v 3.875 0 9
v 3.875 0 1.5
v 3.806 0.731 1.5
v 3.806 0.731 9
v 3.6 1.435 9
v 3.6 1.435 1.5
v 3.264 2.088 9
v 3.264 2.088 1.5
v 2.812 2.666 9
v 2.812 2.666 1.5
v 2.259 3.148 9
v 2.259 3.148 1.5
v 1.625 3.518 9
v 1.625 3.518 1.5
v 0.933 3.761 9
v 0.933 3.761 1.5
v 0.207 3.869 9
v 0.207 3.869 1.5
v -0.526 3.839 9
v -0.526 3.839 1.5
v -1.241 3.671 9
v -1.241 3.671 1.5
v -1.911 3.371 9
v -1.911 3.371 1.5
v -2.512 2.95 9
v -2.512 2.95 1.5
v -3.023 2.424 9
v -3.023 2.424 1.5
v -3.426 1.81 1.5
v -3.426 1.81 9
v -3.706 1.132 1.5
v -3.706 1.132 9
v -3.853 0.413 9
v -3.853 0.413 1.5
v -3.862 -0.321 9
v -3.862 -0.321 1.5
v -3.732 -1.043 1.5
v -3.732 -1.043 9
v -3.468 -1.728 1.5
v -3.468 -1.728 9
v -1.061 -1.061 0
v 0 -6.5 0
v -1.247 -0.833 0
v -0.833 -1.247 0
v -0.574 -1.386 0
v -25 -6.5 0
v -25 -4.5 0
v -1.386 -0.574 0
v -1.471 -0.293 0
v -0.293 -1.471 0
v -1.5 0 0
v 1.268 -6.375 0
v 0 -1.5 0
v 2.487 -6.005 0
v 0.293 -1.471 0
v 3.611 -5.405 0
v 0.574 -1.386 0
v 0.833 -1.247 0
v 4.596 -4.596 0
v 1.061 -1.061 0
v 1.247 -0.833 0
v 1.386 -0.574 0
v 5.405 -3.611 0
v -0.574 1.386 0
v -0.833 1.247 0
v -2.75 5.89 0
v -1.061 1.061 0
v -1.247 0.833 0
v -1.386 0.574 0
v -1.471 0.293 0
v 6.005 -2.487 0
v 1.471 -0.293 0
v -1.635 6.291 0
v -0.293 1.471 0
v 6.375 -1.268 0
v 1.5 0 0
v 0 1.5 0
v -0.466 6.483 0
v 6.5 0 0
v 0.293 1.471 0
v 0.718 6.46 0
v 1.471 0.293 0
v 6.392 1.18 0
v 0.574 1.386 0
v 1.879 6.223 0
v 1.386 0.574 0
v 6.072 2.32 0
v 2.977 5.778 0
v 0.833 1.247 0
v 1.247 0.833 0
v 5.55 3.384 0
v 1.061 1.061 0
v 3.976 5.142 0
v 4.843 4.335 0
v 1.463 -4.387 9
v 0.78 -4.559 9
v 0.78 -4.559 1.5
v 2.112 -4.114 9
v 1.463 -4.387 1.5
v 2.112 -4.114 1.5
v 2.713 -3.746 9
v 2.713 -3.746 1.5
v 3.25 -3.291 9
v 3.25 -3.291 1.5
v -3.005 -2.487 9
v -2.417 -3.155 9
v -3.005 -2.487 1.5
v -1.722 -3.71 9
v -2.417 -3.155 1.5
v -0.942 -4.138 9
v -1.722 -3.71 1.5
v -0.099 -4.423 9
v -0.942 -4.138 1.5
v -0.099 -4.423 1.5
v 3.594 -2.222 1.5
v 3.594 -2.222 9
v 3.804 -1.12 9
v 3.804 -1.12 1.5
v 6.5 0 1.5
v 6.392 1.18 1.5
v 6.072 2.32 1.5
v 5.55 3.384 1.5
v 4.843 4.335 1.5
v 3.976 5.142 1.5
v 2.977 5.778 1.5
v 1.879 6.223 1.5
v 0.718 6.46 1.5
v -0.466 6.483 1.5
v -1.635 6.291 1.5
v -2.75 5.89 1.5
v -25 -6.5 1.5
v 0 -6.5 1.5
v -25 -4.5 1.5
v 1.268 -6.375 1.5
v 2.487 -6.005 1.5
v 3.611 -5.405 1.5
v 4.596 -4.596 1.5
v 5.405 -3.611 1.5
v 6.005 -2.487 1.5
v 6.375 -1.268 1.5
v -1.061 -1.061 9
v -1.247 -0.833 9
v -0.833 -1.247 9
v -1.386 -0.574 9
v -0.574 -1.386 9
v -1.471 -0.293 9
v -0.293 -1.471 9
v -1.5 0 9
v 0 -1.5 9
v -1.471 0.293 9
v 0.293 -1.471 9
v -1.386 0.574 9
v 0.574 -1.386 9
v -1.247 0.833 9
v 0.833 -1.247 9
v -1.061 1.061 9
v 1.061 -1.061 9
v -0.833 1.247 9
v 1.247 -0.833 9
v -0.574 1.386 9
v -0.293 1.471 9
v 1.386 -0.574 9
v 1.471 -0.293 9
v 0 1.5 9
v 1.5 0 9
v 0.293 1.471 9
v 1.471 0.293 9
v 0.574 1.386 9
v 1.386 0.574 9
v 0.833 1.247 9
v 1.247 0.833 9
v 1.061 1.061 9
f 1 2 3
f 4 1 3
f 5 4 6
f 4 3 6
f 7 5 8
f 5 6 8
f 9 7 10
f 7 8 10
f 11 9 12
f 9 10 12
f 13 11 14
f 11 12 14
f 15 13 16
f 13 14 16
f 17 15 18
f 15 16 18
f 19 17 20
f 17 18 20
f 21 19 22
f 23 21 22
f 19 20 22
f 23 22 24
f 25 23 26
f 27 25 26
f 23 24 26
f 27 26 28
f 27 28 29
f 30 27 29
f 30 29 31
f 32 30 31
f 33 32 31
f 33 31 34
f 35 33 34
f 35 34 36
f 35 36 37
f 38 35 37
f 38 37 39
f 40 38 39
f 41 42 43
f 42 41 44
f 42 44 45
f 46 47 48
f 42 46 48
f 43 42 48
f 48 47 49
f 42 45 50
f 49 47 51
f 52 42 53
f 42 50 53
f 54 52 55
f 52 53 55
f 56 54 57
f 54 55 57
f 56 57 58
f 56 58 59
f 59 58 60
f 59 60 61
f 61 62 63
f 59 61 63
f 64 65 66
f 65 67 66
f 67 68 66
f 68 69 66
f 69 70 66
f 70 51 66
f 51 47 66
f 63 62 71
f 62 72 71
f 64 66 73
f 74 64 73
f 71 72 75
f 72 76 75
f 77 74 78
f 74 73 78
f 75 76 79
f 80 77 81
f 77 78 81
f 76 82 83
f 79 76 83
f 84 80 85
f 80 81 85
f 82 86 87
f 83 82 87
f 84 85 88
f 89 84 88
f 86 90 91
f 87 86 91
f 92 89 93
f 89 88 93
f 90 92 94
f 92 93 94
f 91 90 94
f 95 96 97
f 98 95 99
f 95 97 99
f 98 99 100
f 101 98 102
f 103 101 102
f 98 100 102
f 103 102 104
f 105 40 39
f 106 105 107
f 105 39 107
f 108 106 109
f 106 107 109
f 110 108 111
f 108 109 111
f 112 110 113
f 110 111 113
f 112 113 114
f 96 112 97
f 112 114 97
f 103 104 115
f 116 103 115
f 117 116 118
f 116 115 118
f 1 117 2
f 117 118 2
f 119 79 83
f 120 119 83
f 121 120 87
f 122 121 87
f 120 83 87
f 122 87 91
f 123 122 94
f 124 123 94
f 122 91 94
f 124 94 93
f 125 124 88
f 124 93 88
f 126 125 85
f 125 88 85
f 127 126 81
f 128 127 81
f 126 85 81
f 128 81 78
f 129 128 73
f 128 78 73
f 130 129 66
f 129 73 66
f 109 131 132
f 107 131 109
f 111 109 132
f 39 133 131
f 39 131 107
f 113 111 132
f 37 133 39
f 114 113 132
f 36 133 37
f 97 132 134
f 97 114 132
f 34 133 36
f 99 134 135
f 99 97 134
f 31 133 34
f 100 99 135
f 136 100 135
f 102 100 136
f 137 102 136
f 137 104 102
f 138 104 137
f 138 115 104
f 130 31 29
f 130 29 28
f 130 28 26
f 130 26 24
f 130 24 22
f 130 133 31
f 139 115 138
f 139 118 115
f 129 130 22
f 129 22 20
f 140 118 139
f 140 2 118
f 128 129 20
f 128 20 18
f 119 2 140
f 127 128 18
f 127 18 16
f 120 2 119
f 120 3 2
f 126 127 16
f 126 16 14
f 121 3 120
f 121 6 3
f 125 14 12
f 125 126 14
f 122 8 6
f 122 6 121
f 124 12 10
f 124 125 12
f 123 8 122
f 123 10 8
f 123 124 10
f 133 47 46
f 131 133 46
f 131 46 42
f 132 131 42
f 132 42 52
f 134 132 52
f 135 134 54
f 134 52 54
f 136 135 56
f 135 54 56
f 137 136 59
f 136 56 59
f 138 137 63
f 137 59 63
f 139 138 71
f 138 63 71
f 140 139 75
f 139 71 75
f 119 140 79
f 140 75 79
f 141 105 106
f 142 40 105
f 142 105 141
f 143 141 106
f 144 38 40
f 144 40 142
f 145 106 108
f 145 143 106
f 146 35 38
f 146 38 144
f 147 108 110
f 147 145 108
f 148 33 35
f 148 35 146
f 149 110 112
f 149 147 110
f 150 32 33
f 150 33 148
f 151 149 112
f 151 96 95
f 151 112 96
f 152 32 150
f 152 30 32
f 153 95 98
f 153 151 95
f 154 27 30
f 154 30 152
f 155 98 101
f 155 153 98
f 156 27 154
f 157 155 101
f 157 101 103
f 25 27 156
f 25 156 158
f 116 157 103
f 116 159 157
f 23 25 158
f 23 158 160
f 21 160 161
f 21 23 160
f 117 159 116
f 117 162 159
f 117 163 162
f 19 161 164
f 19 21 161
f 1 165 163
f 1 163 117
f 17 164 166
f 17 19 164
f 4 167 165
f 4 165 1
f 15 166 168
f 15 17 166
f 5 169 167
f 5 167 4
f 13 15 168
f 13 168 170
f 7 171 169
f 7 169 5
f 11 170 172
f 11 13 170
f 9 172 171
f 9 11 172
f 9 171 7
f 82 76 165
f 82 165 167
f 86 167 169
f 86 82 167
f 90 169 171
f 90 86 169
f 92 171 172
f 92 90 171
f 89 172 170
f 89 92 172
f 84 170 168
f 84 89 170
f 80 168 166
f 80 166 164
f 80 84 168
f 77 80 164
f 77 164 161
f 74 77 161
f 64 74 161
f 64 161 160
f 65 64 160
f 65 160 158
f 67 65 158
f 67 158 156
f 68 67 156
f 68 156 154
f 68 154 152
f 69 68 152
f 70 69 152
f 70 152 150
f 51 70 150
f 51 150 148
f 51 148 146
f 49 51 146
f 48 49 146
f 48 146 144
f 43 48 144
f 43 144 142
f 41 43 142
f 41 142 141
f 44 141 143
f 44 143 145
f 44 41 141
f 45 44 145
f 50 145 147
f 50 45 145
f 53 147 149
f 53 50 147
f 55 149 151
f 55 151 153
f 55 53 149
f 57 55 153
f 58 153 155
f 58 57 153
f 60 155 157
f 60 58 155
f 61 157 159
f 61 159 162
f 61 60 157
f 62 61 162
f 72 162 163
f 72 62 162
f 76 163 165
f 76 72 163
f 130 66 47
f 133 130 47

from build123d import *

# Parameters (mm, degrees)
F0_R     = 1.5
F1_DEPTH = 1.5
F2_DEPTH = 9


with BuildPart() as f1:
    # F0 (on Top) → F1 (new body)
    with BuildSketch(Plane.XY):
        with BuildLine():
            ThreePointArc((0, -6.5), (-6.345554, -1.408528), (-2.75012, 5.889554))
            Line((-2.75012, 5.889554), (-25, -4.5))
            Line((-25, -4.5), (-25, -6.5))
            Line((-25, -6.5), (0, -6.5))
        make_face()
        with BuildLine():
            ThreePointArc((0, -6.5), (4.596194, -4.596194), (6.5, 0))
            ThreePointArc((6.5, 0), (3.491004, 5.482964), (-2.75012, 5.889554))
            ThreePointArc((-2.75012, 5.889554), (-6.345554, -1.408528), (0, -6.5))
        make_face()
        with BuildLine():
            ThreePointArc((3.270369, 3.270369), (4.272943, 1.769911), (4.625, 0))
            ThreePointArc((4.625, 0), (4.267428, -1.783168), (3.25, -3.290612))
            ThreePointArc((3.25, -3.290612), (2.112462, -4.114381), (0.780118, -4.558732))
            ThreePointArc((0.780118, -4.558732), (-4.407416, 1.401894), (3.270369, 3.270369))
        make_face(mode=Mode.SUBTRACT)
        with BuildLine():
            ThreePointArc((0.780118, -4.558732), (2.112462, -4.114381), (3.25, -3.290612))
            ThreePointArc((3.25, -3.290612), (3.715891, -1.67444), (3.875, 0))
            ThreePointArc((3.875, 0), (-0.887645, 3.771964), (-3.468335, -1.728085))
            ThreePointArc((-3.468335, -1.728085), (-1.721911, -3.710444), (0.780118, -4.558732))
        make_face()
        Circle(F0_R, mode=Mode.SUBTRACT)
        with BuildLine():
            ThreePointArc((3.25, -3.290612), (4.267428, -1.783168), (4.625, 0))
            ThreePointArc((4.625, 0), (4.272943, 1.769911), (3.270369, 3.270369))
            ThreePointArc((3.270369, 3.270369), (3.724037, 1.663167), (3.875, 0))
            ThreePointArc((3.875, 0), (3.715891, -1.67444), (3.25, -3.290612))
        make_face()
        with BuildLine():
            ThreePointArc((3.875, 0), (3.724037, 1.663167), (3.270369, 3.270369))
            ThreePointArc((3.270369, 3.270369), (-4.407416, 1.401894), (0.780118, -4.558732))
            ThreePointArc((0.780118, -4.558732), (-1.721911, -3.710444), (-3.468335, -1.728085))
            ThreePointArc((-3.468335, -1.728085), (-0.887645, 3.771964), (3.875, 0))
        make_face()
    extrude(amount=F1_DEPTH)

    # F0 (on Top) → F2 (join)
    with BuildSketch(Plane.XY):
        with BuildLine():
            ThreePointArc((0.780118, -4.558732), (2.112462, -4.114381), (3.25, -3.290612))
            ThreePointArc((3.25, -3.290612), (3.715891, -1.67444), (3.875, 0))
            ThreePointArc((3.875, 0), (-0.887645, 3.771964), (-3.468335, -1.728085))
            ThreePointArc((-3.468335, -1.728085), (-1.721911, -3.710444), (0.780118, -4.558732))
        make_face()
        Circle(F0_R, mode=Mode.SUBTRACT)
    extrude(amount=F2_DEPTH)


solid = f1.part
